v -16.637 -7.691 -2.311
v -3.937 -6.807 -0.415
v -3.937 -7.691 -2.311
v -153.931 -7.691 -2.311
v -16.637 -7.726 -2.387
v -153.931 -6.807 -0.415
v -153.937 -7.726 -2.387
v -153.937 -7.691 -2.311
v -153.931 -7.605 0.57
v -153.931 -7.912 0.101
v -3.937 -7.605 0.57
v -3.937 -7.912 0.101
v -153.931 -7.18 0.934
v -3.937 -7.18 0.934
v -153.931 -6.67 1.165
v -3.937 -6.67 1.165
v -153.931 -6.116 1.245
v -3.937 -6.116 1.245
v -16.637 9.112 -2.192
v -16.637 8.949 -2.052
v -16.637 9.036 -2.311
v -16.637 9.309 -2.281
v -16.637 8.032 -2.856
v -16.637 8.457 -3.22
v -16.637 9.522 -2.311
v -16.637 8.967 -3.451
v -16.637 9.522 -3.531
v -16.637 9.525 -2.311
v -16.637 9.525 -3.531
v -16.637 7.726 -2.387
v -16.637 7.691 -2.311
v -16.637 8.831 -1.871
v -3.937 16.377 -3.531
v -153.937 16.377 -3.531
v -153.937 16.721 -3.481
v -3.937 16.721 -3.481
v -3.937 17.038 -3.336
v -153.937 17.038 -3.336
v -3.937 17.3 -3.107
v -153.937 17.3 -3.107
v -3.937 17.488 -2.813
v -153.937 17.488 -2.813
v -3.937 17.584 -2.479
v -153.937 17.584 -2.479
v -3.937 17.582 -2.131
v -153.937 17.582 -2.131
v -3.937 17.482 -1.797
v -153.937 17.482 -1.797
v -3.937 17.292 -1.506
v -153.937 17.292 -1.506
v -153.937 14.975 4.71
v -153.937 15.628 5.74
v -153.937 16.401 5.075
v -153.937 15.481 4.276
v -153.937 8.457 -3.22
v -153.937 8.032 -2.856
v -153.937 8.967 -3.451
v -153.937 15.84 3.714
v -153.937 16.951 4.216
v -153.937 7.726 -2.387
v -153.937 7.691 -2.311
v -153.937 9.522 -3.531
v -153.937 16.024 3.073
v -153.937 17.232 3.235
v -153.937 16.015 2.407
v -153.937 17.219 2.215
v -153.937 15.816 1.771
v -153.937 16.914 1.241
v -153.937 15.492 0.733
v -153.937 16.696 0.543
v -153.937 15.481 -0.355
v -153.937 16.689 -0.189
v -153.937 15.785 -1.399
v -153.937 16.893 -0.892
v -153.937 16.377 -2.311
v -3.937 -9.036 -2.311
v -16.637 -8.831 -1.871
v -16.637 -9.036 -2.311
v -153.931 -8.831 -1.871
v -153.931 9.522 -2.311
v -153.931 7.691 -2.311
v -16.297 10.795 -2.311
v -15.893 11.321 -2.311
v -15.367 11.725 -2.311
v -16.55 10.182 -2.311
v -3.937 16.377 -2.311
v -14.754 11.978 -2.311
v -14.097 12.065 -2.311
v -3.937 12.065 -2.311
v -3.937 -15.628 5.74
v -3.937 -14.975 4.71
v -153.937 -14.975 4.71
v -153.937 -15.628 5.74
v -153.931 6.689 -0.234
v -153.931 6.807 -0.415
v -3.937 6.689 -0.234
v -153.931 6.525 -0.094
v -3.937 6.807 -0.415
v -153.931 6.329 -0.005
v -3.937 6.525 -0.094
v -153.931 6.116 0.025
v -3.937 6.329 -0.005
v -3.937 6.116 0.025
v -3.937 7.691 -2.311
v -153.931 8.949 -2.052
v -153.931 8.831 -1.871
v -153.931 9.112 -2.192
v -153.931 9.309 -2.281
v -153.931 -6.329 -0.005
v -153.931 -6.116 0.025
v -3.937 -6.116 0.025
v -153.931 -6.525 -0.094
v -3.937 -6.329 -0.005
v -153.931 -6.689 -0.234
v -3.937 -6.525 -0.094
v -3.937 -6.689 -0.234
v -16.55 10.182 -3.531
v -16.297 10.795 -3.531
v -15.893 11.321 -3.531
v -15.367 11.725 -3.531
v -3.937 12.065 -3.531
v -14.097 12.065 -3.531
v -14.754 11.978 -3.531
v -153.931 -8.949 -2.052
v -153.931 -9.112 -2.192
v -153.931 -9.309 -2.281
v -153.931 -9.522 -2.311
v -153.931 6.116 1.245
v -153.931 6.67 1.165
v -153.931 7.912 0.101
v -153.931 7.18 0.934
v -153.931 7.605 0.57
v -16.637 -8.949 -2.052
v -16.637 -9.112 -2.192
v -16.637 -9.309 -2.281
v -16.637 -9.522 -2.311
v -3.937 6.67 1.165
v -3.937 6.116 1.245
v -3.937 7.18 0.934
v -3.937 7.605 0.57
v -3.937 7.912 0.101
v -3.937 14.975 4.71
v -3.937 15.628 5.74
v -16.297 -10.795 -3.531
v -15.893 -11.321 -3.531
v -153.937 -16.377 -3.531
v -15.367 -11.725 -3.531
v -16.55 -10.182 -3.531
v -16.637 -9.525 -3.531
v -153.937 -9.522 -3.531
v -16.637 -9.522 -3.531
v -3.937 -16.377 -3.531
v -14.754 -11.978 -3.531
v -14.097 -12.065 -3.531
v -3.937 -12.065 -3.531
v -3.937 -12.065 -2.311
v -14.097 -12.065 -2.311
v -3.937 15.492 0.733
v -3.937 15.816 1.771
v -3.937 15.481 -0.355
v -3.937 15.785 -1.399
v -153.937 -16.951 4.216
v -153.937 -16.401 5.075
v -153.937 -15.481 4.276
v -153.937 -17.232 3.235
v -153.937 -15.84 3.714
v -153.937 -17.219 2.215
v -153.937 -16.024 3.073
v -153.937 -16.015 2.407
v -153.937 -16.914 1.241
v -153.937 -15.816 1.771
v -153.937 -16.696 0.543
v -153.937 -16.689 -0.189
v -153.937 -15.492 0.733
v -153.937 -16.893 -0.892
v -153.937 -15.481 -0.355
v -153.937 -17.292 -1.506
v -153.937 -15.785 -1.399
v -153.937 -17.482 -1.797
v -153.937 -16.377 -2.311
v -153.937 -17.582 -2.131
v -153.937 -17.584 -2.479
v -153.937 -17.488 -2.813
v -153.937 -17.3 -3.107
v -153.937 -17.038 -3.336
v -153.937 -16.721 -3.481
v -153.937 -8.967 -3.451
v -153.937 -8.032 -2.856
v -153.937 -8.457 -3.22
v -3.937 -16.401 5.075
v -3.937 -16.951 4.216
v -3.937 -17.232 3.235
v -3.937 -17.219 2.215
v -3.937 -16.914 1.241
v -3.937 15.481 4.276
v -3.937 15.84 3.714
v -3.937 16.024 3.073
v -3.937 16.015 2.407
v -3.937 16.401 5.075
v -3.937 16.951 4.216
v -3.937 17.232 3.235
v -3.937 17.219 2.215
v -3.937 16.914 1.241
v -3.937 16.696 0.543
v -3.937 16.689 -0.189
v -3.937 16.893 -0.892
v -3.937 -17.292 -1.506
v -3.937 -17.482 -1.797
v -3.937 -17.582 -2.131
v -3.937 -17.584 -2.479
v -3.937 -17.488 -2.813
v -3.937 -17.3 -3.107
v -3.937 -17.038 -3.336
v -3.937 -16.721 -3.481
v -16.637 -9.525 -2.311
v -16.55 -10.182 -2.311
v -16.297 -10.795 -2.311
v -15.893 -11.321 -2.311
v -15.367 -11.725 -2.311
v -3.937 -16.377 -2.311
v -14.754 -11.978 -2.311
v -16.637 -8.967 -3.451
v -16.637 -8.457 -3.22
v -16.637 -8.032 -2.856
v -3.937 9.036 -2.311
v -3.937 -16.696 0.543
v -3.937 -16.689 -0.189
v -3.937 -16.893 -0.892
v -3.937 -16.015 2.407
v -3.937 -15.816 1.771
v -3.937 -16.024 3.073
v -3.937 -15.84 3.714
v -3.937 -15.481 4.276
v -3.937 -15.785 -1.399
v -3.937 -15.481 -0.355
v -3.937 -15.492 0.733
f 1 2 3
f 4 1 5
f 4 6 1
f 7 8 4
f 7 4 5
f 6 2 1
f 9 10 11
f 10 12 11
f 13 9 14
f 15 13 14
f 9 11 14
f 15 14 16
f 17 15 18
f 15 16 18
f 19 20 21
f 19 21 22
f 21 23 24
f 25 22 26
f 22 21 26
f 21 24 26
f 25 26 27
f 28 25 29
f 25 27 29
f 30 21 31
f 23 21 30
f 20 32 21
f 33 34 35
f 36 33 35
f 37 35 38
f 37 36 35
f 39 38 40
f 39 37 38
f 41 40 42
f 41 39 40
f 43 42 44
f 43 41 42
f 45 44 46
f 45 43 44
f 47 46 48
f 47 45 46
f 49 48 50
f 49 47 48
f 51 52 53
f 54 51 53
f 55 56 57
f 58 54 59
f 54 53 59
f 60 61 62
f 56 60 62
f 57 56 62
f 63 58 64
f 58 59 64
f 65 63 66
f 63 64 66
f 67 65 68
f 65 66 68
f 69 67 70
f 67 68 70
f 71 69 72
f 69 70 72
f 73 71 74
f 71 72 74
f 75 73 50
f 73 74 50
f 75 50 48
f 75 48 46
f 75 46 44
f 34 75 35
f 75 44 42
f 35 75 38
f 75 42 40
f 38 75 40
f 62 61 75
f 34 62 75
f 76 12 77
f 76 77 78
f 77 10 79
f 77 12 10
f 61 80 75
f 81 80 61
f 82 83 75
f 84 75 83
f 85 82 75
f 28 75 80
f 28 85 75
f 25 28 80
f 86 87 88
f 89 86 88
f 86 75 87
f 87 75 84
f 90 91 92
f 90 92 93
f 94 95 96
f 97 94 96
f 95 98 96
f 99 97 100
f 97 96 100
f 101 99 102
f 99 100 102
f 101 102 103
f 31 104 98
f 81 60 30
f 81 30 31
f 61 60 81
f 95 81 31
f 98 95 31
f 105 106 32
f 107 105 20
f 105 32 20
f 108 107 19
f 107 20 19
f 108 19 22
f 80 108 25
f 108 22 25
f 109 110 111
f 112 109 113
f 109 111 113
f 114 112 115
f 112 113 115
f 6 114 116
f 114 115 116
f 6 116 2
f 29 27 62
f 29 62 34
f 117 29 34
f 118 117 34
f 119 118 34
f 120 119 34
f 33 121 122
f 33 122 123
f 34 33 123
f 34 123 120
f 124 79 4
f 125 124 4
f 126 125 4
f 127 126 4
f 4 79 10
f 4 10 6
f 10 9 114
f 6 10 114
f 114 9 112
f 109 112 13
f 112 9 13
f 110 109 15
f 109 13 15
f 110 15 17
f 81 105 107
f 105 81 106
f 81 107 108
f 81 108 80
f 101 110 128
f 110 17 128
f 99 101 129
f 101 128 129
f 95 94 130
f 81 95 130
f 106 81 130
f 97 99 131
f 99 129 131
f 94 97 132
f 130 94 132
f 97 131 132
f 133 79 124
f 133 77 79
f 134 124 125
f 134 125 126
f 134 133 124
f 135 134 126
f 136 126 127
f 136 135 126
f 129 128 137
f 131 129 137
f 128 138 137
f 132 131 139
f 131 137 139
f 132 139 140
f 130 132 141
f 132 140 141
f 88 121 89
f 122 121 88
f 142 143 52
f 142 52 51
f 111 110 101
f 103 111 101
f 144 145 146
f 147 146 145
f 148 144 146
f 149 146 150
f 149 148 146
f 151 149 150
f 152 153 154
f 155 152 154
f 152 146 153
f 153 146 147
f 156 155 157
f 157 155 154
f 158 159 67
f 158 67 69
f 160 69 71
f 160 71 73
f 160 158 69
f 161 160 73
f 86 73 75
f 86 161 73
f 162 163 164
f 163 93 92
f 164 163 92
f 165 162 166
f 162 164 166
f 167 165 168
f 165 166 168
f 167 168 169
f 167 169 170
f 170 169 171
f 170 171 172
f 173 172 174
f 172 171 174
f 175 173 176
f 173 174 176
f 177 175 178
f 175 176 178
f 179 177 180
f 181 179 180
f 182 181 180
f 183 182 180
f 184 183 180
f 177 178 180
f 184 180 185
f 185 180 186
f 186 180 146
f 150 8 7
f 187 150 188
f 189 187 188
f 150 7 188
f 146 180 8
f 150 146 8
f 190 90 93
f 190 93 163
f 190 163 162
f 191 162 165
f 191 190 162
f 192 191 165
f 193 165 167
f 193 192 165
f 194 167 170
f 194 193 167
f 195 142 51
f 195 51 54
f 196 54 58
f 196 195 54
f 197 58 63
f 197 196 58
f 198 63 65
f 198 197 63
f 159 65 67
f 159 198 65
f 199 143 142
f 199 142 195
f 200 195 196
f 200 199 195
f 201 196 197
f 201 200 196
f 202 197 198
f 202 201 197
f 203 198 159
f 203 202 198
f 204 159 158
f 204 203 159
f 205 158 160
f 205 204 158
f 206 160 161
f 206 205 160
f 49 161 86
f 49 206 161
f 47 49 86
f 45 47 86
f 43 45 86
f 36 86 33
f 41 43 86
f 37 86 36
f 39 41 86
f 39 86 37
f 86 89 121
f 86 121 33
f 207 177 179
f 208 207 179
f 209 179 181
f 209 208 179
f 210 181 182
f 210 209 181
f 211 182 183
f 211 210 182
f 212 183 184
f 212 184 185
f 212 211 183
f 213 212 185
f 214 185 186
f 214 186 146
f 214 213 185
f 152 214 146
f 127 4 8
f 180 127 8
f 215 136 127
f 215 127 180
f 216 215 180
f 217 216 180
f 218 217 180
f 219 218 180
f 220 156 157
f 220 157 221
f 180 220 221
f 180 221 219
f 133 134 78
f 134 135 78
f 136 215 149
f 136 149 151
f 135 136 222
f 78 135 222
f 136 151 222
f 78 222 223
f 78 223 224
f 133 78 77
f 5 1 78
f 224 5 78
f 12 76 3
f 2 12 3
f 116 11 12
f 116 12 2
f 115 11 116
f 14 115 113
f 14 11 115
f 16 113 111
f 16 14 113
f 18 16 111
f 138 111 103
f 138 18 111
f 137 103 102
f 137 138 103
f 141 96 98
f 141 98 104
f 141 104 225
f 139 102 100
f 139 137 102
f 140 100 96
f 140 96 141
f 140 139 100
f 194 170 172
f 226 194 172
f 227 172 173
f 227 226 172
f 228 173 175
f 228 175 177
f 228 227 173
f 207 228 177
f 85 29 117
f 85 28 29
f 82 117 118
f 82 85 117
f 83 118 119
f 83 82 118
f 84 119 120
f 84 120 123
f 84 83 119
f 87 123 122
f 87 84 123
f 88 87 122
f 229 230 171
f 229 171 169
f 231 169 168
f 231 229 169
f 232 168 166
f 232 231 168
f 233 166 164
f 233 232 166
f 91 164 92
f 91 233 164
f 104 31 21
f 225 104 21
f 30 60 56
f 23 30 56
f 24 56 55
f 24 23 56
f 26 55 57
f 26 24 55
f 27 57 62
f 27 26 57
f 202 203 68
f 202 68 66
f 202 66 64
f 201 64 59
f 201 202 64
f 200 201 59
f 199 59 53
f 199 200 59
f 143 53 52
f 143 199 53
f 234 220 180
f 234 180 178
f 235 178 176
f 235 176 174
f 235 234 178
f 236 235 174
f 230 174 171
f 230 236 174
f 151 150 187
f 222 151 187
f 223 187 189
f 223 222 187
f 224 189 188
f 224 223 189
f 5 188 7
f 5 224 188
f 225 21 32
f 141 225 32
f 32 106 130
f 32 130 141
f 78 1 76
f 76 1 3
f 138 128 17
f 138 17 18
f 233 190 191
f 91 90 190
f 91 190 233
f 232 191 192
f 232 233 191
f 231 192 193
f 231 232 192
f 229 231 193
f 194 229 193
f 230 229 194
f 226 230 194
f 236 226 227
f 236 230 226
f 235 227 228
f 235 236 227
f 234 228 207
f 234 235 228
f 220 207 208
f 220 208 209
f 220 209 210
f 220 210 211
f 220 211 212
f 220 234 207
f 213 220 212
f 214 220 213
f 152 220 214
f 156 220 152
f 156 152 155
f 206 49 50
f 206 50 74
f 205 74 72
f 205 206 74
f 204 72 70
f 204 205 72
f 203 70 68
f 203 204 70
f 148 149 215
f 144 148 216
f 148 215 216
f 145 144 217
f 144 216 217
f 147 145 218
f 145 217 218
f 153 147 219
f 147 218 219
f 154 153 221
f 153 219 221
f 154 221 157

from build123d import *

# Parameters (mm, degrees)
BOSS_EXTRUDE1_DEPTH = 150
SKETCH2_W           = 12.7
SKETCH2_H           = 24.13
CUT_EXTRUDE1_DEPTH  = 156.216502449
SKETCH3_W           = 149.993973466
SKETCH3_H           = 14.75620072
BOSS_EXTRUDE2_DEPTH = 3.55599999
SKETCH4_W           = 3.55599999
SKETCH4_H           = 13.202768596
CUT_EXTRUDE2_DEPTH  = 152.137564539
DRAFT1_START        = -153.930973466
DRAFT1_DEPTH        = 149.993973466
DRAFT2_START        = -153.937
DRAFT2_DEPTH        = 150
FILLET1_R           = 0.76200009
FILLET2_R           = 1.98120009
FILLET3_R           = 2.54


# Read off the part's stored shape, not the designer's step: Draft1, Draft2
with BuildPart() as part:
    # Sketch1 → Boss-Extrude1 (new body)
    with BuildSketch(Plane(origin=(-3.937, 0, 0), x_dir=(0, 0, -1), z_dir=(1, 0, 0))):
        with BuildLine():
            Line((2.311399989, 16.37657286), (2.311399989, -16.37657286))
            ThreePointArc((2.311399989, -16.37657286), (0.354826715, -15.481038557), (-1.770730805, -15.815950332))
            ThreePointArc((-1.770730805, -15.815950332), (-3.400639082, -15.955235788), (-4.710462095, -14.975253591))
            Line((-4.710462095, -14.975253591), (-5.7404, -15.627692517))
            ThreePointArc((-5.7404, -15.627692517), (-3.73586423, -17.127444277), (-1.241474216, -16.914283663))
            ThreePointArc((-1.241474216, -16.914283663), (0.188944014, -16.688900954), (1.505642365, -17.291560998))
            ThreePointArc((1.505642365, -17.291560998), (2.81343034, -17.487614789), (3.53059999, -16.37657286))
            Line((3.53059999, -16.37657286), (3.53059999, 16.37657286))
            ThreePointArc((3.53059999, 16.37657286), (2.81343034, 17.487614789), (1.505642365, 17.291560998))
            ThreePointArc((1.505642365, 17.291560998), (0.188944014, 16.688900954), (-1.241474216, 16.914283663))
            ThreePointArc((-1.241474216, 16.914283663), (-3.73586423, 17.127444277), (-5.7404, 15.627692517))
            Line((-5.7404, 15.627692517), (-4.710462095, 14.975253591))
            ThreePointArc((-4.710462095, 14.975253591), (-3.400639082, 15.955235788), (-1.770730805, 15.815950332))
            ThreePointArc((-1.770730805, 15.815950332), (0.354826715, 15.481038557), (2.311399989, 16.37657286))
        make_face()
    extrude(amount=-BOSS_EXTRUDE1_DEPTH)

    # Sketch2 → Cut-Extrude1 (cut, through all)
    with BuildSketch(Plane(origin=(0, 0, -3.53059999), x_dir=(-1, 0, 0), z_dir=(0, 0, -1))):
        with Locations((10.287, 0)):
            Rectangle(SKETCH2_W, SKETCH2_H)
    extrude(amount=-CUT_EXTRUDE1_DEPTH, mode=Mode.SUBTRACT)

    # Sketch3 → Boss-Extrude2 (add)
    with BuildSketch(Plane.XY.offset(-2.311399989)):
        with Locations((-78.933986733, 0)):
            Rectangle(SKETCH3_W, SKETCH3_H)
    extrude(amount=BOSS_EXTRUDE2_DEPTH)

    # Sketch4 → Cut-Extrude2 (cut, through all)
    with BuildSketch(Plane.ZY.offset(153.937)):
        with Locations((-1.752599995, 0)):
            Rectangle(SKETCH4_W, SKETCH4_H)
    extrude(amount=-CUT_EXTRUDE2_DEPTH, mode=Mode.SUBTRACT)

    # Draft1 outline → Draft1 (add)
    with BuildSketch(Plane.YZ.offset(DRAFT1_START)):
        Polygon((7.37810036, 1.244600001), (7.37810036, -2.311399989), (9.036290388, -2.311399989), align=None)
        Polygon((-7.37810036, 1.244600001), (-9.036290388, -2.311399989), (-7.37810036, -2.311399989), align=None)
    extrude(amount=DRAFT1_DEPTH)

    # Draft2 outline → Draft2 (cut)
    with BuildSketch(Plane.YZ.offset(DRAFT2_START)):
        Polygon((6.601384298, 0.0254), (6.601384298, -3.53059999), (8.259574326, -3.53059999), align=None)
        Polygon((-8.259574326, -3.53059999), (-6.601384298, -3.53059999), (-6.601384298, 0.0254), align=None)
    extrude(amount=DRAFT2_DEPTH, mode=Mode.SUBTRACT)

    # Fillet1
    fillet1_edges = [part.edges().sort_by_distance(p)[0] for p in [
        (-85.283986733, -9.036290388, -2.311399989),
        (-85.283986733, 9.036290388, -2.311399989),
        (-78.933986733, 6.601384298, 0.0254),
        (-78.933986733, -6.601384298, 0.0254),
    ]]
    fillet(fillet1_edges, radius=FILLET1_R)

    # Fillet2
    fillet2_edges = [part.edges().sort_by_distance(p)[0] for p in [
        (-78.933986733, -7.37810036, 1.244600001),
        (-78.933986733, 7.37810036, 1.244600001),
        (-85.287, -8.259574326, -3.53059999),
        (-85.287, 8.259574326, -3.53059999),
    ]]
    fillet(fillet2_edges, radius=FILLET2_R)

    # Fillet3
    fillet3_edges = [part.edges().sort_by_distance(p)[0] for p in [
        (-16.637, 12.065, -2.92099999),
        (-16.637, -12.065, -2.92099999),
    ]]
    fillet(fillet3_edges, radius=FILLET3_R)


solid = part.part
